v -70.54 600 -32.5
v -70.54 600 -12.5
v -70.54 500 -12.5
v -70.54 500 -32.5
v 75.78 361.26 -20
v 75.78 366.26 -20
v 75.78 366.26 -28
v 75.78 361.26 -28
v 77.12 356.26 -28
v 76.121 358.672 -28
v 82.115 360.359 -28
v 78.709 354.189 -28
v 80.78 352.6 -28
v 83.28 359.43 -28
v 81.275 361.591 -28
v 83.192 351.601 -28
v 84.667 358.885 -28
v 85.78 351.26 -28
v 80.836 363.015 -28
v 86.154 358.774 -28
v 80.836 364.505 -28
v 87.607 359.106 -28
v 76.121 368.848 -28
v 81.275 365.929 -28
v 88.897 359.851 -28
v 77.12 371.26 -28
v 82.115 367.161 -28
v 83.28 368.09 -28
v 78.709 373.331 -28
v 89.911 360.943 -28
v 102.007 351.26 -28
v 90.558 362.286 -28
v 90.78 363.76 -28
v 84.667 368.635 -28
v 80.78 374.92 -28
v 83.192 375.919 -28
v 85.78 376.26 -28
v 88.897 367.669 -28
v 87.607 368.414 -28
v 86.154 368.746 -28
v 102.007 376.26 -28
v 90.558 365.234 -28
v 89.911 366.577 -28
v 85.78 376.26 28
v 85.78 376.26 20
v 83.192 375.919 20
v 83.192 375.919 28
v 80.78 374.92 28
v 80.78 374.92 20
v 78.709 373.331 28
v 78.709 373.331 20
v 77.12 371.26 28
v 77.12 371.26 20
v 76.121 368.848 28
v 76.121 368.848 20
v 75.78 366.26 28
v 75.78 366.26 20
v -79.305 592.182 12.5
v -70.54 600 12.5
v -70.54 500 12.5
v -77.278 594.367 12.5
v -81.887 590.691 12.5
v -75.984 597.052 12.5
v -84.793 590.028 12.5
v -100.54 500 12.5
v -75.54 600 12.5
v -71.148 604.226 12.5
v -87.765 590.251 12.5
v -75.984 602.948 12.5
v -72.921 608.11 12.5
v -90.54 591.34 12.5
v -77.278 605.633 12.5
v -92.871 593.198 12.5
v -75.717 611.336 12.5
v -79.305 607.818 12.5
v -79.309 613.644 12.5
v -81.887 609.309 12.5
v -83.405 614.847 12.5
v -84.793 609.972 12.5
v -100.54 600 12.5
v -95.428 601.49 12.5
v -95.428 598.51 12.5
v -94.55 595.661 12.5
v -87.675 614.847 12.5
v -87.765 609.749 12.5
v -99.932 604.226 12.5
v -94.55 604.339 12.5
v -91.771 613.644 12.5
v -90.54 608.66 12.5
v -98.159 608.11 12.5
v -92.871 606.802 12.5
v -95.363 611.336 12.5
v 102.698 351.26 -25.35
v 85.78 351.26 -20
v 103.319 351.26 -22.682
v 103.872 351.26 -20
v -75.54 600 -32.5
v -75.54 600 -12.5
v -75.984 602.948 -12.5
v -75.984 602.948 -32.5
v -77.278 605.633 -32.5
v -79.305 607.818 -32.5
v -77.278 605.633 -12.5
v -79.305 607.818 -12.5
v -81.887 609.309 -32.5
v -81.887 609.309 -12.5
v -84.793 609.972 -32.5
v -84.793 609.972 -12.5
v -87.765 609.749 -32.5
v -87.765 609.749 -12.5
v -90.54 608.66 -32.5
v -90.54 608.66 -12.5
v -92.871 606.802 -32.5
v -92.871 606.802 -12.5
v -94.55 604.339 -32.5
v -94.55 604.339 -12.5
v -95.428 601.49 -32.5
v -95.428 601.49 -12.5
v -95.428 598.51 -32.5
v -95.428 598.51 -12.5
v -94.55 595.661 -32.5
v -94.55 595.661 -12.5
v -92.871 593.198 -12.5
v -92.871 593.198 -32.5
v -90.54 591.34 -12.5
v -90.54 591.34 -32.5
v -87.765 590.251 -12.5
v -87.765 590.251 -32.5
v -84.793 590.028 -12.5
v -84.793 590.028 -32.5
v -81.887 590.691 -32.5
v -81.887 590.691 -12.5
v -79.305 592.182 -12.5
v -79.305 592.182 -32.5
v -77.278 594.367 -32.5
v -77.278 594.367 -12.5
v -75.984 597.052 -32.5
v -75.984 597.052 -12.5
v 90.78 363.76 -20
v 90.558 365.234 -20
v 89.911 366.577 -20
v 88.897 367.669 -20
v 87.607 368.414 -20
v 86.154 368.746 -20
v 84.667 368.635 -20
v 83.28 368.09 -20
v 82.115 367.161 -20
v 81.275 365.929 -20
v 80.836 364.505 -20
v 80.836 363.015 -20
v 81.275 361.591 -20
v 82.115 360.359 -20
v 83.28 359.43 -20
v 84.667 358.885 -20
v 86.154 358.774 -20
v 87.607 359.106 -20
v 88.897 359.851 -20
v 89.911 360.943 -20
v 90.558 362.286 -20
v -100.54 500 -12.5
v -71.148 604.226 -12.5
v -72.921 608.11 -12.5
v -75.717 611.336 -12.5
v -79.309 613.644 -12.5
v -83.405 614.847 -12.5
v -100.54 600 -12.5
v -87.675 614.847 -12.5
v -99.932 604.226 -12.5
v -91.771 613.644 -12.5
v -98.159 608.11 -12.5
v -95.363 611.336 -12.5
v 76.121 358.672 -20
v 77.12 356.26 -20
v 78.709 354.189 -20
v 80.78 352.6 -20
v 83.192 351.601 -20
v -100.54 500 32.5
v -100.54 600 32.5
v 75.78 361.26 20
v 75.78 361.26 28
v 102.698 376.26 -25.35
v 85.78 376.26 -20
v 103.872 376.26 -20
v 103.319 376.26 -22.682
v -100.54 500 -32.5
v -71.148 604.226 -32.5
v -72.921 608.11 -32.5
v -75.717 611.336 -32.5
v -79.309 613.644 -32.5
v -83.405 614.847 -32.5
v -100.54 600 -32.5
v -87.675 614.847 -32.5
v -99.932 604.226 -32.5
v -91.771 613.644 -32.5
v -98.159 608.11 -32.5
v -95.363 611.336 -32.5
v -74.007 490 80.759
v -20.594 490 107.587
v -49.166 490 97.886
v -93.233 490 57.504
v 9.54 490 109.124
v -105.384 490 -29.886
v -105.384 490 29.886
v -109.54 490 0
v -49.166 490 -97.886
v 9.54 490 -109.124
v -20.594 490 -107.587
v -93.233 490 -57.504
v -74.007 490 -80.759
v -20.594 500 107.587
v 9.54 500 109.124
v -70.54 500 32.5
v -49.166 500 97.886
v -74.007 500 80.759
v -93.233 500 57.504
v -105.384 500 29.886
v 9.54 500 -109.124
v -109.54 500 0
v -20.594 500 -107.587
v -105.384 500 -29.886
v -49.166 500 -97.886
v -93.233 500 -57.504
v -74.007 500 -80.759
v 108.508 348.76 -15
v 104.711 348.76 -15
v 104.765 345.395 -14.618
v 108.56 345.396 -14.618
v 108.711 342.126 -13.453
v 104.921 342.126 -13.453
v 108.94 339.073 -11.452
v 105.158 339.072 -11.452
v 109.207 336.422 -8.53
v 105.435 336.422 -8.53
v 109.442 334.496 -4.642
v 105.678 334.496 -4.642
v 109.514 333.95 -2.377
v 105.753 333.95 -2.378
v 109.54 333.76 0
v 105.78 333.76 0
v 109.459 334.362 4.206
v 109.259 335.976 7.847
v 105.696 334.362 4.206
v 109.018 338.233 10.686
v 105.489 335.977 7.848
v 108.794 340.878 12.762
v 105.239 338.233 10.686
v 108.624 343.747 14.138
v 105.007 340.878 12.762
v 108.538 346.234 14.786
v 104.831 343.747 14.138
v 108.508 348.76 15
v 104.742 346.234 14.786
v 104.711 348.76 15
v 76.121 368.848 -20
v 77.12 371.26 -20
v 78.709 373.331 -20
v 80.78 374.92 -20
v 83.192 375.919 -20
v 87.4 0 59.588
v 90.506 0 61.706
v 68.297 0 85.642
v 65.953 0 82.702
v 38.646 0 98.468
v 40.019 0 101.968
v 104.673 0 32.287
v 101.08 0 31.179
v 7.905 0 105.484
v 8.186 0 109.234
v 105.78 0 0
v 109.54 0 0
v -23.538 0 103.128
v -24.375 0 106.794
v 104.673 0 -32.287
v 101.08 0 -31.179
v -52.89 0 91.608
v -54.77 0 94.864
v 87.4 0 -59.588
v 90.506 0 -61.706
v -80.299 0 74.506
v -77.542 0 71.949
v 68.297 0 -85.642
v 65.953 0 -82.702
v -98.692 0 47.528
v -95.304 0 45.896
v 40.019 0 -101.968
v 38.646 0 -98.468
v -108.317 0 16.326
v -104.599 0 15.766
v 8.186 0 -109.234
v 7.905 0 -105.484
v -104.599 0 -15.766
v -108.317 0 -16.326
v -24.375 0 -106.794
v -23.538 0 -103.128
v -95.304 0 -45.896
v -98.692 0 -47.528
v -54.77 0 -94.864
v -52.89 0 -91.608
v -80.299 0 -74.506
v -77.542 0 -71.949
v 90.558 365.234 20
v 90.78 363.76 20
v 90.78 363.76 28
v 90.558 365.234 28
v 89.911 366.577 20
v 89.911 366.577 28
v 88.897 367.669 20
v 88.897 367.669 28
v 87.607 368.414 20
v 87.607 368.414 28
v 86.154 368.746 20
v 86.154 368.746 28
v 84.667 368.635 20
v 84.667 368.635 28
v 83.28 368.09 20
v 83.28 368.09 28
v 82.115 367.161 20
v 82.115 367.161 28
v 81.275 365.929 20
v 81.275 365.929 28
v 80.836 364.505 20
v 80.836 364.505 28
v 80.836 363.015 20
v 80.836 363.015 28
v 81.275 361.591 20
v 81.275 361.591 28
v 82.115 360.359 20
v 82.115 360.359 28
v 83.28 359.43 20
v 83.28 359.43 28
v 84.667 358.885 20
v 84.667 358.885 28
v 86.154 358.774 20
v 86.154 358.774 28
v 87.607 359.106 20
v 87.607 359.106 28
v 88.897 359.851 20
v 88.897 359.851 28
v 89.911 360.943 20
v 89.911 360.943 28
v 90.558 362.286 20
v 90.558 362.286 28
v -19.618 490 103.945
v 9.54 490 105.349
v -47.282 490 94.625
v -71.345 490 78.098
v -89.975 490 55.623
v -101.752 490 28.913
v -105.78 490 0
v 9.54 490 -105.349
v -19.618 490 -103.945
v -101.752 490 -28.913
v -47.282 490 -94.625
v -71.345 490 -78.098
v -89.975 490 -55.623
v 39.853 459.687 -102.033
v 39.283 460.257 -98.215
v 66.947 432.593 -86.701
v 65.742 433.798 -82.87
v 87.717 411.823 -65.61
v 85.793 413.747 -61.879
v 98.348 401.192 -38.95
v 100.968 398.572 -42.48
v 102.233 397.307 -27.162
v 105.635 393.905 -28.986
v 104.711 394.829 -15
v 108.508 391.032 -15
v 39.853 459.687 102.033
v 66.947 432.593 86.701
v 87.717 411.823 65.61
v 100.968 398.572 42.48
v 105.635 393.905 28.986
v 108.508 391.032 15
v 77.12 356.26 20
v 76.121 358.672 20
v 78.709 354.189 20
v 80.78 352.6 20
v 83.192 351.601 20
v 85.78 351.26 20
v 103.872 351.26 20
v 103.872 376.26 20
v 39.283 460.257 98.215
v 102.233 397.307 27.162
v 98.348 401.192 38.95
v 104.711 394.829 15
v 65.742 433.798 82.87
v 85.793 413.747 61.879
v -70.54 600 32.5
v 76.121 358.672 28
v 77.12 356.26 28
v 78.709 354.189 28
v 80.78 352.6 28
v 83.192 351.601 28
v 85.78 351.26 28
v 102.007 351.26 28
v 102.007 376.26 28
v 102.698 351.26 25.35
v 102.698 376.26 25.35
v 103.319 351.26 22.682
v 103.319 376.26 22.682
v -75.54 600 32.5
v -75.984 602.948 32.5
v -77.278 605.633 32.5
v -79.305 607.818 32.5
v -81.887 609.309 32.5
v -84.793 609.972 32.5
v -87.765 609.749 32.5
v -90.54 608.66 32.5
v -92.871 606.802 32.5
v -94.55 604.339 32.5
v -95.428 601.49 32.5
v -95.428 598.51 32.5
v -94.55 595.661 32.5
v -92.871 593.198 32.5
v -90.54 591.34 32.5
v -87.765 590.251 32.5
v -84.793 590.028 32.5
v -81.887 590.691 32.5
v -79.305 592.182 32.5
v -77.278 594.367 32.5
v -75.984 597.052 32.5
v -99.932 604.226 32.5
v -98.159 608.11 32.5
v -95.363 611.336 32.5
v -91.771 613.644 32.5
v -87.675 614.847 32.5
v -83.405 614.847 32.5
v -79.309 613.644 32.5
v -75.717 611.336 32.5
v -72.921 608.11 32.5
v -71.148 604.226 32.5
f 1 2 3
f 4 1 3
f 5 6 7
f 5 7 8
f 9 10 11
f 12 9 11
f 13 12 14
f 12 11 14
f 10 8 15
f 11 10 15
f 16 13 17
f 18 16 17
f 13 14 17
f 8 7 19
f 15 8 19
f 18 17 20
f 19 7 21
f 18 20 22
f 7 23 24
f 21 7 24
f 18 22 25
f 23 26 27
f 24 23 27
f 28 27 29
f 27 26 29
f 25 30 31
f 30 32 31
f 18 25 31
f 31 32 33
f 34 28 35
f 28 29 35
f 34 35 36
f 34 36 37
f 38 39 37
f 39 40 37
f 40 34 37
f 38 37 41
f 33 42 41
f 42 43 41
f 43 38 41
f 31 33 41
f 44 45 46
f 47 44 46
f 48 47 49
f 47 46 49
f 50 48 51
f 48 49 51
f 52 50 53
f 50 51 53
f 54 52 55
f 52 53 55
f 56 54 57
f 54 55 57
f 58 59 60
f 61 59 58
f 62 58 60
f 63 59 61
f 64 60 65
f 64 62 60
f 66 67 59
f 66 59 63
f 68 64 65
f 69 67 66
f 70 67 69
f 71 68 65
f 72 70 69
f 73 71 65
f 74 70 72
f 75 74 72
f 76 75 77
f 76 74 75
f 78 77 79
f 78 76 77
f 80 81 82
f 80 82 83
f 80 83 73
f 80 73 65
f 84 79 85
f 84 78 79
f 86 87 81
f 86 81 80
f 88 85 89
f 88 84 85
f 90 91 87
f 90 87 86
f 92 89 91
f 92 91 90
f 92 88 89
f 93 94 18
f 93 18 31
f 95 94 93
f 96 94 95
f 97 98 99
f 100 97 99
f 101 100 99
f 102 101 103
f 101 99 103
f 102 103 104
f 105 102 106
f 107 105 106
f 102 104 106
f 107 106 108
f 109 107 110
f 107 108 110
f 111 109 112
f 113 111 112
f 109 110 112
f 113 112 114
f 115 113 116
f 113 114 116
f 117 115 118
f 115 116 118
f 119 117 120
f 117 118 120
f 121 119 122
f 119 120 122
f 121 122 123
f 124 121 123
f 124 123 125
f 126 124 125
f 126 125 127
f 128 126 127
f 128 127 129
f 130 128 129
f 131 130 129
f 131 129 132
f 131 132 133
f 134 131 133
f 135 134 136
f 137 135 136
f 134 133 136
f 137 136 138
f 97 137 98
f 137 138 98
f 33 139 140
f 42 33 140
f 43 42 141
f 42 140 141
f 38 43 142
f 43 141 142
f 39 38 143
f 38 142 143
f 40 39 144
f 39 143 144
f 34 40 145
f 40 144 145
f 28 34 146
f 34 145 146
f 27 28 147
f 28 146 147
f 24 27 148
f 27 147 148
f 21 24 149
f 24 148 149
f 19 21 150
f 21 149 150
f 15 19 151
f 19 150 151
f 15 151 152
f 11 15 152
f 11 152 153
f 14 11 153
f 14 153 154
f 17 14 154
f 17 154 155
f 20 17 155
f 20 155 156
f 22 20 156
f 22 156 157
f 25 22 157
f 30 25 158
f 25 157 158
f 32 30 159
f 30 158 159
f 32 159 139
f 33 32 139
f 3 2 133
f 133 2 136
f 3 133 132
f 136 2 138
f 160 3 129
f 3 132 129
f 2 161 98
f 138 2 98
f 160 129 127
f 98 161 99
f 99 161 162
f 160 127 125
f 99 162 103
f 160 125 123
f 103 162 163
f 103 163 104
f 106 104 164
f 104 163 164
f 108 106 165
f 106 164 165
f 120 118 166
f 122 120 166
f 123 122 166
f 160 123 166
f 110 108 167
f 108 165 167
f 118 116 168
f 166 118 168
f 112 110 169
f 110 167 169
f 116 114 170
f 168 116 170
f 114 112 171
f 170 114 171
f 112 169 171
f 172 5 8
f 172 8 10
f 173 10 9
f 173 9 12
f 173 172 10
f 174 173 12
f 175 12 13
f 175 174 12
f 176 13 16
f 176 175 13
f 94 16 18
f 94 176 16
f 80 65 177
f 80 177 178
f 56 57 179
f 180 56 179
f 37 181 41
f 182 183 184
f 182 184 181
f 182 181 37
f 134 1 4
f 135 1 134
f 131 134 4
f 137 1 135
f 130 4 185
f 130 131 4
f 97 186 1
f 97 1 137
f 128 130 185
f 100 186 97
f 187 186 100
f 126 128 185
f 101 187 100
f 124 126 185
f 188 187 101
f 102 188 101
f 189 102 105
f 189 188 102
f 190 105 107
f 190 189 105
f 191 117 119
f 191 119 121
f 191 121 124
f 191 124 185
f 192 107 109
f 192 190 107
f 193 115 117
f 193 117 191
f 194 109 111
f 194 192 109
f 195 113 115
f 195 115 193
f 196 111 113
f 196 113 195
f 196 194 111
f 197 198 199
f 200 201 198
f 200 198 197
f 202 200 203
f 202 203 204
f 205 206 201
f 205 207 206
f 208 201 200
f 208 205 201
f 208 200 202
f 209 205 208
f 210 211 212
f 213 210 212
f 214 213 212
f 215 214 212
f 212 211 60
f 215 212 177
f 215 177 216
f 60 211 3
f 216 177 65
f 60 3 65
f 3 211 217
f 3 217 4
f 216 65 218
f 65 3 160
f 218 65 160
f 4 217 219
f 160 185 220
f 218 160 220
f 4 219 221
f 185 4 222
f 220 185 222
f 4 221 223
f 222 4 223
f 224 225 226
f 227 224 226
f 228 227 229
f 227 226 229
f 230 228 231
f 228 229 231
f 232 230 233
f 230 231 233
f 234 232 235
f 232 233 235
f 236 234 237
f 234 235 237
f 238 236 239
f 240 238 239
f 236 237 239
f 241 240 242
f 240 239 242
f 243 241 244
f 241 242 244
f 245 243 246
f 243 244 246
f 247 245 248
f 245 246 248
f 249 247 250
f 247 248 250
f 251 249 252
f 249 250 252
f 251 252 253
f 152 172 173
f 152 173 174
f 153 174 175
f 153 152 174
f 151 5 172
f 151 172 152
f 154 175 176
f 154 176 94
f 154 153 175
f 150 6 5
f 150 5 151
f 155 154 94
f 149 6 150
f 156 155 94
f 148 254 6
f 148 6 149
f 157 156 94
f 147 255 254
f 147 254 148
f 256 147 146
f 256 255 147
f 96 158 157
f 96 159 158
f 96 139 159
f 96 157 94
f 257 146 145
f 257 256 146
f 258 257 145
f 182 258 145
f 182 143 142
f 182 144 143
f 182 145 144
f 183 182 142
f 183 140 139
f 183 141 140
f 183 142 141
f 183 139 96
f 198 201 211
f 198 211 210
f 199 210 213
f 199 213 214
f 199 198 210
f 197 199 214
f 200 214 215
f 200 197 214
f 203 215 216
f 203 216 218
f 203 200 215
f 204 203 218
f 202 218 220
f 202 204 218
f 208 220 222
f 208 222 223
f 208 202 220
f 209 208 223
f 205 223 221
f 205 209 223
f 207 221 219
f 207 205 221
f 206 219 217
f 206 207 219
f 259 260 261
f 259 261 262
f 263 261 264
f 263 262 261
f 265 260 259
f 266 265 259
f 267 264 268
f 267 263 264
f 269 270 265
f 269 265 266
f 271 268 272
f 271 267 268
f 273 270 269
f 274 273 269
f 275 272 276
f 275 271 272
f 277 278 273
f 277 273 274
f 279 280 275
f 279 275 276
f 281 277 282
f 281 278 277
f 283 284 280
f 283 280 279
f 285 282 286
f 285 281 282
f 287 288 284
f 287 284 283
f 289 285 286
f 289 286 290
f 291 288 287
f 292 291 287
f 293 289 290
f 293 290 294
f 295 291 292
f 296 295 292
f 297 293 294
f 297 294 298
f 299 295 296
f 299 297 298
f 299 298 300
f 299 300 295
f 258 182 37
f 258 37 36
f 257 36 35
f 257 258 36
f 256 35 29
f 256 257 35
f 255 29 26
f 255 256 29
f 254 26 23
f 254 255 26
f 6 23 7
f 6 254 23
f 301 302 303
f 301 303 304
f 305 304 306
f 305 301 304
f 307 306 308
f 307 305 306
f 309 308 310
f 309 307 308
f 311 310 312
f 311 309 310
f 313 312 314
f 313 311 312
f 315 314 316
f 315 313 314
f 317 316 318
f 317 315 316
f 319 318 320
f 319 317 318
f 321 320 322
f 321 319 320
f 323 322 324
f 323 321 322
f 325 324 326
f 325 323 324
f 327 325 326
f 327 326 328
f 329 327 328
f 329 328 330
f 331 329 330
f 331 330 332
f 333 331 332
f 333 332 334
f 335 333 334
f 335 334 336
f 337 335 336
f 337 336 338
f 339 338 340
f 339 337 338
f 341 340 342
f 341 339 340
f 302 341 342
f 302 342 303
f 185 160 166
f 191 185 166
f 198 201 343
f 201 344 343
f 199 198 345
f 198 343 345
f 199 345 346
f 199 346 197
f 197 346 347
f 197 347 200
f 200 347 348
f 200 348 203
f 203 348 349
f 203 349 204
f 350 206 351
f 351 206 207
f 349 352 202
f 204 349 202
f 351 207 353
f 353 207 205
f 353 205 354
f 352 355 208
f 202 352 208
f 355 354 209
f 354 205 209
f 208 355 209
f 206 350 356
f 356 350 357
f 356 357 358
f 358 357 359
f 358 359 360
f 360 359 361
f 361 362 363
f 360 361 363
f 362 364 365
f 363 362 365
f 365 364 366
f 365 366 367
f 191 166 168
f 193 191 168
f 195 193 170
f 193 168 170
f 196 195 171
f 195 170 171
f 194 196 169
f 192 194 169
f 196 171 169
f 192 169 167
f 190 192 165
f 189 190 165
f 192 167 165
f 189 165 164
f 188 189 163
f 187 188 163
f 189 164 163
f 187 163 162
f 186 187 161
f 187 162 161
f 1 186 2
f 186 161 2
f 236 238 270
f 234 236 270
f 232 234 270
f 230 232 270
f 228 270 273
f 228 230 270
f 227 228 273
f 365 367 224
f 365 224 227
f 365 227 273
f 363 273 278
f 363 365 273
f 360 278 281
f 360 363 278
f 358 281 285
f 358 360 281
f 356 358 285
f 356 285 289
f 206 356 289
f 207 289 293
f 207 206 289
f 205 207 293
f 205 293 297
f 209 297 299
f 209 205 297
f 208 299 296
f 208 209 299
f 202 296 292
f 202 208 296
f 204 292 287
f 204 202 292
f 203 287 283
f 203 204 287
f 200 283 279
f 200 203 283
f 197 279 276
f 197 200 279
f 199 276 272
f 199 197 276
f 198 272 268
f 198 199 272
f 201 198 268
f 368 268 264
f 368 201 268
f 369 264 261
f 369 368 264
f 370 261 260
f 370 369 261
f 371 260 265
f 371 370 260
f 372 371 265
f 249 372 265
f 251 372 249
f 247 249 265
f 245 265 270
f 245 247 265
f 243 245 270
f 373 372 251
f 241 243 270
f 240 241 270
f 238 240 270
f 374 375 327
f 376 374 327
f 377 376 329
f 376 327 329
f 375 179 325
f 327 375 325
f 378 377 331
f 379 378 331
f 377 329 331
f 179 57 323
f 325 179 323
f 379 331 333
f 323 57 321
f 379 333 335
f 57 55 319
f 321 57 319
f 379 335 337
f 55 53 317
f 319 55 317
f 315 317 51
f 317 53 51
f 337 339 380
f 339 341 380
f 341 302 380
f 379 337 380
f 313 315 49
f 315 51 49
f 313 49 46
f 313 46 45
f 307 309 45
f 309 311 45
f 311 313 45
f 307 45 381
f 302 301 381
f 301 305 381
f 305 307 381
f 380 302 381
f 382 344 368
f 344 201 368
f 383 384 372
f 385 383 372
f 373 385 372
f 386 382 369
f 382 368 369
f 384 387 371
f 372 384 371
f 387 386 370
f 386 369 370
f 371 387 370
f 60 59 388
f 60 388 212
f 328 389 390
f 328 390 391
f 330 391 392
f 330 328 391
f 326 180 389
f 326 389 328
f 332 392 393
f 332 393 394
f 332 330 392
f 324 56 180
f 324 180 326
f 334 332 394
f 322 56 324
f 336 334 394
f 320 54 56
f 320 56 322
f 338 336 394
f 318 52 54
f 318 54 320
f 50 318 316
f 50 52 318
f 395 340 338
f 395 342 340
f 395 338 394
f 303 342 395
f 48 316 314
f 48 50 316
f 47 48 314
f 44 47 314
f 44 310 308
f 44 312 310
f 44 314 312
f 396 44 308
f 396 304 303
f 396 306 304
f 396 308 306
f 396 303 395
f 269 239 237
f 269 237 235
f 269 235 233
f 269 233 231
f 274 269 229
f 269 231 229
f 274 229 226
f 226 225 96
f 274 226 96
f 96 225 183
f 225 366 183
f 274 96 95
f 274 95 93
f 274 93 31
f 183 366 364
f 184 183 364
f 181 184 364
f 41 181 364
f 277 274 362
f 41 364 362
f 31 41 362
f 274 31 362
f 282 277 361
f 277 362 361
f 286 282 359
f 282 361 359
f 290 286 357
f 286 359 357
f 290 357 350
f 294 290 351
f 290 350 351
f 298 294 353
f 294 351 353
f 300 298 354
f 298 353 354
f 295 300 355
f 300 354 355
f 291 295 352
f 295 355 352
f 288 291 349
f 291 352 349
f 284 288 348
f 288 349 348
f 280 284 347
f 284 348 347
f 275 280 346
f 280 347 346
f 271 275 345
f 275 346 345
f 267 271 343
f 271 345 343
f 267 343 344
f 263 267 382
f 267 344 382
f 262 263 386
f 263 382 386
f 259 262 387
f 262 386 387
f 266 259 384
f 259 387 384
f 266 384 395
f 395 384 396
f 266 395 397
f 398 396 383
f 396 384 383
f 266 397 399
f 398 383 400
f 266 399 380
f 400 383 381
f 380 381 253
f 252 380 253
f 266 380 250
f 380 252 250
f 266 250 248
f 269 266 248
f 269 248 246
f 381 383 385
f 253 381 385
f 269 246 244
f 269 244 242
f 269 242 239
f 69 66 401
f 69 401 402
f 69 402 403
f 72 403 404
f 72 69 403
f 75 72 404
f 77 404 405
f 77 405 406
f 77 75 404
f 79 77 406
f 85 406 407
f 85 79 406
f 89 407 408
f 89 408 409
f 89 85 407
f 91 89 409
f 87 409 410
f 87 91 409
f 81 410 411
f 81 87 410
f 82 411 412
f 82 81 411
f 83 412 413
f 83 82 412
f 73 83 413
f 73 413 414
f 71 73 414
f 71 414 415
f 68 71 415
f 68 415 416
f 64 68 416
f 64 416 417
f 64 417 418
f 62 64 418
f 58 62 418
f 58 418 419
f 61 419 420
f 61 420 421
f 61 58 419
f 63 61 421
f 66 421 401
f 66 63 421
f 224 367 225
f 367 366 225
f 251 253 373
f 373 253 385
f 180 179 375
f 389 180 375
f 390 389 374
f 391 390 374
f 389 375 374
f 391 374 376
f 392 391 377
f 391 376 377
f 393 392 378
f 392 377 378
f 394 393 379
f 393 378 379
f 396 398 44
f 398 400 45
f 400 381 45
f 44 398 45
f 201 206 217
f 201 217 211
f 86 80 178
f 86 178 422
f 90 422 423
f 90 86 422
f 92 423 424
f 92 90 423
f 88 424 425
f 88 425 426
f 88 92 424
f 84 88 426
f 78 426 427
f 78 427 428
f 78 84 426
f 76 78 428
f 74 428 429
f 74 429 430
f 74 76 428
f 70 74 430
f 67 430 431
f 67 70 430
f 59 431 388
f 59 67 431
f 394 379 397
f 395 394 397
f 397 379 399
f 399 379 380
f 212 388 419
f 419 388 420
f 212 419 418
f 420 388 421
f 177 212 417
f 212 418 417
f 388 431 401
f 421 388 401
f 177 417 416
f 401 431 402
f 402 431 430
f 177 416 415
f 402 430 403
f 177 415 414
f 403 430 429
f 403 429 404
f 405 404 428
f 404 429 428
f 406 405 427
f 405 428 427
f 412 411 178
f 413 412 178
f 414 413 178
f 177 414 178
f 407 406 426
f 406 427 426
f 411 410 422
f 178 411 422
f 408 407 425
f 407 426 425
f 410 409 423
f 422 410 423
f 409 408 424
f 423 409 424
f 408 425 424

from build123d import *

# Parameters (mm, degrees)
ESBO_O1_W                  = 3.76
ESBO_O1_H                  = 490
CORTE_EXTRUS_O1_DEPTH      = 110.54
CORTE_EXTRUS_O1_DEPTH_BACK = 110.54
RESSALTO_EXTRUS_O1_DEPTH   = 10
RESSALTO_EXTRUS_O2_START   = 12.5
ESBO_O4_R                  = 10
RESSALTO_EXTRUS_O2_DEPTH   = 20
RESSALTO_EXTRUS_O3_START   = 20
ESBO_O5_R                  = 5
RESSALTO_EXTRUS_O3_DEPTH   = 8
CORTE_EXTRUS_O2_DEPTH      = 110.54


with BuildPart() as part:
    # Esboço1 → Revolução1 (revolve)
    with BuildSketch(Plane.XY):
        with Locations((107.66, 245)):
            Rectangle(ESBO_O1_W, ESBO_O1_H)
    revolve(axis=Axis((0, 0, 0), (0, 1, 0)))

    # Esboço2 → Corte-extrusão1 (cut, two sides)
    with BuildSketch(Plane.XY) as corte_extrus_o1_sk:
        Polygon((9.54, 490), (109.54, 390), (109.54, 490), align=None)
    extrude(amount=CORTE_EXTRUS_O1_DEPTH, mode=Mode.SUBTRACT)
    extrude(corte_extrus_o1_sk.sketch, amount=-CORTE_EXTRUS_O1_DEPTH_BACK, mode=Mode.SUBTRACT)

    # Esboço5 → Ressalto-extrusão3 (add)
    with BuildSketch(Plane.XY.offset(RESSALTO_EXTRUS_O3_START)):
        with BuildLine():
            Line((105.78, 376.26), (85.78, 376.26))
            ThreePointArc((85.78, 376.26), (78.708932188, 373.331067812), (75.78, 366.26))
            Line((75.78, 366.26), (75.78, 361.26))
            ThreePointArc((75.78, 361.26), (78.708932188, 354.188932188), (85.78, 351.26))
            Line((85.78, 351.26), (105.78, 351.26))
            Line((105.78, 351.26), (105.78, 376.26))
        make_face()
        with Locations((85.78, 363.76)):
            Circle(ESBO_O5_R, mode=Mode.SUBTRACT)
    ressalto_extrus_o3 = extrude(amount=RESSALTO_EXTRUS_O3_DEPTH)

    # Espelhar2: Ressalto-extrusão3 across plane
    add(ressalto_extrus_o3.mirror(Plane.XY))

    # Esboço6 → Corte-extrusão2 (cut, through all)
    with BuildSketch(Plane(origin=(0, 0, 0), x_dir=(0, 0, -1), z_dir=(1, 0, 0))):
        with BuildLine():
            Line((-15, 348.76), (-15, 475))
            ThreePointArc((-15, 475), (0, 490), (15, 475))
            Line((15, 475), (15, 348.76))
            ThreePointArc((15, 348.76), (0, 333.76), (-15, 348.76))
        make_face()
    extrude(amount=CORTE_EXTRUS_O2_DEPTH, mode=Mode.SUBTRACT)


with BuildPart() as body_2:
    # Esboço3 → Ressalto-extrusão1 (new body)
    with BuildSketch(Plane(origin=(0, 490, 0), x_dir=(1, 0, 0), z_dir=(0, 1, 0))):
        with BuildLine():
            Line((9.54, 109.123782926), (9.54, -109.123782926))
            ThreePointArc((9.54, -109.123782926), (-109.54, 0), (9.54, 109.123782926))
        make_face()
    extrude(amount=RESSALTO_EXTRUS_O1_DEPTH)

    # Esboço4 → Ressalto-extrusão2 (add)
    with BuildSketch(Plane.XY.offset(RESSALTO_EXTRUS_O2_START)):
        with BuildLine():
            Line((-100.54, 500), (-100.54, 600))
            ThreePointArc((-100.54, 600), (-85.54, 615), (-70.54, 600))
            Line((-70.54, 600), (-70.54, 500))
            Line((-70.54, 500), (-100.54, 500))
        make_face()
        with Locations((-85.54, 600)):
            Circle(ESBO_O4_R, mode=Mode.SUBTRACT)
    ressalto_extrus_o2 = extrude(amount=RESSALTO_EXTRUS_O2_DEPTH)

    # Espelhar1: Ressalto-extrusão2 across plane
    add(ressalto_extrus_o2.mirror(Plane.XY))


solid = Compound([part.part, body_2.part])
